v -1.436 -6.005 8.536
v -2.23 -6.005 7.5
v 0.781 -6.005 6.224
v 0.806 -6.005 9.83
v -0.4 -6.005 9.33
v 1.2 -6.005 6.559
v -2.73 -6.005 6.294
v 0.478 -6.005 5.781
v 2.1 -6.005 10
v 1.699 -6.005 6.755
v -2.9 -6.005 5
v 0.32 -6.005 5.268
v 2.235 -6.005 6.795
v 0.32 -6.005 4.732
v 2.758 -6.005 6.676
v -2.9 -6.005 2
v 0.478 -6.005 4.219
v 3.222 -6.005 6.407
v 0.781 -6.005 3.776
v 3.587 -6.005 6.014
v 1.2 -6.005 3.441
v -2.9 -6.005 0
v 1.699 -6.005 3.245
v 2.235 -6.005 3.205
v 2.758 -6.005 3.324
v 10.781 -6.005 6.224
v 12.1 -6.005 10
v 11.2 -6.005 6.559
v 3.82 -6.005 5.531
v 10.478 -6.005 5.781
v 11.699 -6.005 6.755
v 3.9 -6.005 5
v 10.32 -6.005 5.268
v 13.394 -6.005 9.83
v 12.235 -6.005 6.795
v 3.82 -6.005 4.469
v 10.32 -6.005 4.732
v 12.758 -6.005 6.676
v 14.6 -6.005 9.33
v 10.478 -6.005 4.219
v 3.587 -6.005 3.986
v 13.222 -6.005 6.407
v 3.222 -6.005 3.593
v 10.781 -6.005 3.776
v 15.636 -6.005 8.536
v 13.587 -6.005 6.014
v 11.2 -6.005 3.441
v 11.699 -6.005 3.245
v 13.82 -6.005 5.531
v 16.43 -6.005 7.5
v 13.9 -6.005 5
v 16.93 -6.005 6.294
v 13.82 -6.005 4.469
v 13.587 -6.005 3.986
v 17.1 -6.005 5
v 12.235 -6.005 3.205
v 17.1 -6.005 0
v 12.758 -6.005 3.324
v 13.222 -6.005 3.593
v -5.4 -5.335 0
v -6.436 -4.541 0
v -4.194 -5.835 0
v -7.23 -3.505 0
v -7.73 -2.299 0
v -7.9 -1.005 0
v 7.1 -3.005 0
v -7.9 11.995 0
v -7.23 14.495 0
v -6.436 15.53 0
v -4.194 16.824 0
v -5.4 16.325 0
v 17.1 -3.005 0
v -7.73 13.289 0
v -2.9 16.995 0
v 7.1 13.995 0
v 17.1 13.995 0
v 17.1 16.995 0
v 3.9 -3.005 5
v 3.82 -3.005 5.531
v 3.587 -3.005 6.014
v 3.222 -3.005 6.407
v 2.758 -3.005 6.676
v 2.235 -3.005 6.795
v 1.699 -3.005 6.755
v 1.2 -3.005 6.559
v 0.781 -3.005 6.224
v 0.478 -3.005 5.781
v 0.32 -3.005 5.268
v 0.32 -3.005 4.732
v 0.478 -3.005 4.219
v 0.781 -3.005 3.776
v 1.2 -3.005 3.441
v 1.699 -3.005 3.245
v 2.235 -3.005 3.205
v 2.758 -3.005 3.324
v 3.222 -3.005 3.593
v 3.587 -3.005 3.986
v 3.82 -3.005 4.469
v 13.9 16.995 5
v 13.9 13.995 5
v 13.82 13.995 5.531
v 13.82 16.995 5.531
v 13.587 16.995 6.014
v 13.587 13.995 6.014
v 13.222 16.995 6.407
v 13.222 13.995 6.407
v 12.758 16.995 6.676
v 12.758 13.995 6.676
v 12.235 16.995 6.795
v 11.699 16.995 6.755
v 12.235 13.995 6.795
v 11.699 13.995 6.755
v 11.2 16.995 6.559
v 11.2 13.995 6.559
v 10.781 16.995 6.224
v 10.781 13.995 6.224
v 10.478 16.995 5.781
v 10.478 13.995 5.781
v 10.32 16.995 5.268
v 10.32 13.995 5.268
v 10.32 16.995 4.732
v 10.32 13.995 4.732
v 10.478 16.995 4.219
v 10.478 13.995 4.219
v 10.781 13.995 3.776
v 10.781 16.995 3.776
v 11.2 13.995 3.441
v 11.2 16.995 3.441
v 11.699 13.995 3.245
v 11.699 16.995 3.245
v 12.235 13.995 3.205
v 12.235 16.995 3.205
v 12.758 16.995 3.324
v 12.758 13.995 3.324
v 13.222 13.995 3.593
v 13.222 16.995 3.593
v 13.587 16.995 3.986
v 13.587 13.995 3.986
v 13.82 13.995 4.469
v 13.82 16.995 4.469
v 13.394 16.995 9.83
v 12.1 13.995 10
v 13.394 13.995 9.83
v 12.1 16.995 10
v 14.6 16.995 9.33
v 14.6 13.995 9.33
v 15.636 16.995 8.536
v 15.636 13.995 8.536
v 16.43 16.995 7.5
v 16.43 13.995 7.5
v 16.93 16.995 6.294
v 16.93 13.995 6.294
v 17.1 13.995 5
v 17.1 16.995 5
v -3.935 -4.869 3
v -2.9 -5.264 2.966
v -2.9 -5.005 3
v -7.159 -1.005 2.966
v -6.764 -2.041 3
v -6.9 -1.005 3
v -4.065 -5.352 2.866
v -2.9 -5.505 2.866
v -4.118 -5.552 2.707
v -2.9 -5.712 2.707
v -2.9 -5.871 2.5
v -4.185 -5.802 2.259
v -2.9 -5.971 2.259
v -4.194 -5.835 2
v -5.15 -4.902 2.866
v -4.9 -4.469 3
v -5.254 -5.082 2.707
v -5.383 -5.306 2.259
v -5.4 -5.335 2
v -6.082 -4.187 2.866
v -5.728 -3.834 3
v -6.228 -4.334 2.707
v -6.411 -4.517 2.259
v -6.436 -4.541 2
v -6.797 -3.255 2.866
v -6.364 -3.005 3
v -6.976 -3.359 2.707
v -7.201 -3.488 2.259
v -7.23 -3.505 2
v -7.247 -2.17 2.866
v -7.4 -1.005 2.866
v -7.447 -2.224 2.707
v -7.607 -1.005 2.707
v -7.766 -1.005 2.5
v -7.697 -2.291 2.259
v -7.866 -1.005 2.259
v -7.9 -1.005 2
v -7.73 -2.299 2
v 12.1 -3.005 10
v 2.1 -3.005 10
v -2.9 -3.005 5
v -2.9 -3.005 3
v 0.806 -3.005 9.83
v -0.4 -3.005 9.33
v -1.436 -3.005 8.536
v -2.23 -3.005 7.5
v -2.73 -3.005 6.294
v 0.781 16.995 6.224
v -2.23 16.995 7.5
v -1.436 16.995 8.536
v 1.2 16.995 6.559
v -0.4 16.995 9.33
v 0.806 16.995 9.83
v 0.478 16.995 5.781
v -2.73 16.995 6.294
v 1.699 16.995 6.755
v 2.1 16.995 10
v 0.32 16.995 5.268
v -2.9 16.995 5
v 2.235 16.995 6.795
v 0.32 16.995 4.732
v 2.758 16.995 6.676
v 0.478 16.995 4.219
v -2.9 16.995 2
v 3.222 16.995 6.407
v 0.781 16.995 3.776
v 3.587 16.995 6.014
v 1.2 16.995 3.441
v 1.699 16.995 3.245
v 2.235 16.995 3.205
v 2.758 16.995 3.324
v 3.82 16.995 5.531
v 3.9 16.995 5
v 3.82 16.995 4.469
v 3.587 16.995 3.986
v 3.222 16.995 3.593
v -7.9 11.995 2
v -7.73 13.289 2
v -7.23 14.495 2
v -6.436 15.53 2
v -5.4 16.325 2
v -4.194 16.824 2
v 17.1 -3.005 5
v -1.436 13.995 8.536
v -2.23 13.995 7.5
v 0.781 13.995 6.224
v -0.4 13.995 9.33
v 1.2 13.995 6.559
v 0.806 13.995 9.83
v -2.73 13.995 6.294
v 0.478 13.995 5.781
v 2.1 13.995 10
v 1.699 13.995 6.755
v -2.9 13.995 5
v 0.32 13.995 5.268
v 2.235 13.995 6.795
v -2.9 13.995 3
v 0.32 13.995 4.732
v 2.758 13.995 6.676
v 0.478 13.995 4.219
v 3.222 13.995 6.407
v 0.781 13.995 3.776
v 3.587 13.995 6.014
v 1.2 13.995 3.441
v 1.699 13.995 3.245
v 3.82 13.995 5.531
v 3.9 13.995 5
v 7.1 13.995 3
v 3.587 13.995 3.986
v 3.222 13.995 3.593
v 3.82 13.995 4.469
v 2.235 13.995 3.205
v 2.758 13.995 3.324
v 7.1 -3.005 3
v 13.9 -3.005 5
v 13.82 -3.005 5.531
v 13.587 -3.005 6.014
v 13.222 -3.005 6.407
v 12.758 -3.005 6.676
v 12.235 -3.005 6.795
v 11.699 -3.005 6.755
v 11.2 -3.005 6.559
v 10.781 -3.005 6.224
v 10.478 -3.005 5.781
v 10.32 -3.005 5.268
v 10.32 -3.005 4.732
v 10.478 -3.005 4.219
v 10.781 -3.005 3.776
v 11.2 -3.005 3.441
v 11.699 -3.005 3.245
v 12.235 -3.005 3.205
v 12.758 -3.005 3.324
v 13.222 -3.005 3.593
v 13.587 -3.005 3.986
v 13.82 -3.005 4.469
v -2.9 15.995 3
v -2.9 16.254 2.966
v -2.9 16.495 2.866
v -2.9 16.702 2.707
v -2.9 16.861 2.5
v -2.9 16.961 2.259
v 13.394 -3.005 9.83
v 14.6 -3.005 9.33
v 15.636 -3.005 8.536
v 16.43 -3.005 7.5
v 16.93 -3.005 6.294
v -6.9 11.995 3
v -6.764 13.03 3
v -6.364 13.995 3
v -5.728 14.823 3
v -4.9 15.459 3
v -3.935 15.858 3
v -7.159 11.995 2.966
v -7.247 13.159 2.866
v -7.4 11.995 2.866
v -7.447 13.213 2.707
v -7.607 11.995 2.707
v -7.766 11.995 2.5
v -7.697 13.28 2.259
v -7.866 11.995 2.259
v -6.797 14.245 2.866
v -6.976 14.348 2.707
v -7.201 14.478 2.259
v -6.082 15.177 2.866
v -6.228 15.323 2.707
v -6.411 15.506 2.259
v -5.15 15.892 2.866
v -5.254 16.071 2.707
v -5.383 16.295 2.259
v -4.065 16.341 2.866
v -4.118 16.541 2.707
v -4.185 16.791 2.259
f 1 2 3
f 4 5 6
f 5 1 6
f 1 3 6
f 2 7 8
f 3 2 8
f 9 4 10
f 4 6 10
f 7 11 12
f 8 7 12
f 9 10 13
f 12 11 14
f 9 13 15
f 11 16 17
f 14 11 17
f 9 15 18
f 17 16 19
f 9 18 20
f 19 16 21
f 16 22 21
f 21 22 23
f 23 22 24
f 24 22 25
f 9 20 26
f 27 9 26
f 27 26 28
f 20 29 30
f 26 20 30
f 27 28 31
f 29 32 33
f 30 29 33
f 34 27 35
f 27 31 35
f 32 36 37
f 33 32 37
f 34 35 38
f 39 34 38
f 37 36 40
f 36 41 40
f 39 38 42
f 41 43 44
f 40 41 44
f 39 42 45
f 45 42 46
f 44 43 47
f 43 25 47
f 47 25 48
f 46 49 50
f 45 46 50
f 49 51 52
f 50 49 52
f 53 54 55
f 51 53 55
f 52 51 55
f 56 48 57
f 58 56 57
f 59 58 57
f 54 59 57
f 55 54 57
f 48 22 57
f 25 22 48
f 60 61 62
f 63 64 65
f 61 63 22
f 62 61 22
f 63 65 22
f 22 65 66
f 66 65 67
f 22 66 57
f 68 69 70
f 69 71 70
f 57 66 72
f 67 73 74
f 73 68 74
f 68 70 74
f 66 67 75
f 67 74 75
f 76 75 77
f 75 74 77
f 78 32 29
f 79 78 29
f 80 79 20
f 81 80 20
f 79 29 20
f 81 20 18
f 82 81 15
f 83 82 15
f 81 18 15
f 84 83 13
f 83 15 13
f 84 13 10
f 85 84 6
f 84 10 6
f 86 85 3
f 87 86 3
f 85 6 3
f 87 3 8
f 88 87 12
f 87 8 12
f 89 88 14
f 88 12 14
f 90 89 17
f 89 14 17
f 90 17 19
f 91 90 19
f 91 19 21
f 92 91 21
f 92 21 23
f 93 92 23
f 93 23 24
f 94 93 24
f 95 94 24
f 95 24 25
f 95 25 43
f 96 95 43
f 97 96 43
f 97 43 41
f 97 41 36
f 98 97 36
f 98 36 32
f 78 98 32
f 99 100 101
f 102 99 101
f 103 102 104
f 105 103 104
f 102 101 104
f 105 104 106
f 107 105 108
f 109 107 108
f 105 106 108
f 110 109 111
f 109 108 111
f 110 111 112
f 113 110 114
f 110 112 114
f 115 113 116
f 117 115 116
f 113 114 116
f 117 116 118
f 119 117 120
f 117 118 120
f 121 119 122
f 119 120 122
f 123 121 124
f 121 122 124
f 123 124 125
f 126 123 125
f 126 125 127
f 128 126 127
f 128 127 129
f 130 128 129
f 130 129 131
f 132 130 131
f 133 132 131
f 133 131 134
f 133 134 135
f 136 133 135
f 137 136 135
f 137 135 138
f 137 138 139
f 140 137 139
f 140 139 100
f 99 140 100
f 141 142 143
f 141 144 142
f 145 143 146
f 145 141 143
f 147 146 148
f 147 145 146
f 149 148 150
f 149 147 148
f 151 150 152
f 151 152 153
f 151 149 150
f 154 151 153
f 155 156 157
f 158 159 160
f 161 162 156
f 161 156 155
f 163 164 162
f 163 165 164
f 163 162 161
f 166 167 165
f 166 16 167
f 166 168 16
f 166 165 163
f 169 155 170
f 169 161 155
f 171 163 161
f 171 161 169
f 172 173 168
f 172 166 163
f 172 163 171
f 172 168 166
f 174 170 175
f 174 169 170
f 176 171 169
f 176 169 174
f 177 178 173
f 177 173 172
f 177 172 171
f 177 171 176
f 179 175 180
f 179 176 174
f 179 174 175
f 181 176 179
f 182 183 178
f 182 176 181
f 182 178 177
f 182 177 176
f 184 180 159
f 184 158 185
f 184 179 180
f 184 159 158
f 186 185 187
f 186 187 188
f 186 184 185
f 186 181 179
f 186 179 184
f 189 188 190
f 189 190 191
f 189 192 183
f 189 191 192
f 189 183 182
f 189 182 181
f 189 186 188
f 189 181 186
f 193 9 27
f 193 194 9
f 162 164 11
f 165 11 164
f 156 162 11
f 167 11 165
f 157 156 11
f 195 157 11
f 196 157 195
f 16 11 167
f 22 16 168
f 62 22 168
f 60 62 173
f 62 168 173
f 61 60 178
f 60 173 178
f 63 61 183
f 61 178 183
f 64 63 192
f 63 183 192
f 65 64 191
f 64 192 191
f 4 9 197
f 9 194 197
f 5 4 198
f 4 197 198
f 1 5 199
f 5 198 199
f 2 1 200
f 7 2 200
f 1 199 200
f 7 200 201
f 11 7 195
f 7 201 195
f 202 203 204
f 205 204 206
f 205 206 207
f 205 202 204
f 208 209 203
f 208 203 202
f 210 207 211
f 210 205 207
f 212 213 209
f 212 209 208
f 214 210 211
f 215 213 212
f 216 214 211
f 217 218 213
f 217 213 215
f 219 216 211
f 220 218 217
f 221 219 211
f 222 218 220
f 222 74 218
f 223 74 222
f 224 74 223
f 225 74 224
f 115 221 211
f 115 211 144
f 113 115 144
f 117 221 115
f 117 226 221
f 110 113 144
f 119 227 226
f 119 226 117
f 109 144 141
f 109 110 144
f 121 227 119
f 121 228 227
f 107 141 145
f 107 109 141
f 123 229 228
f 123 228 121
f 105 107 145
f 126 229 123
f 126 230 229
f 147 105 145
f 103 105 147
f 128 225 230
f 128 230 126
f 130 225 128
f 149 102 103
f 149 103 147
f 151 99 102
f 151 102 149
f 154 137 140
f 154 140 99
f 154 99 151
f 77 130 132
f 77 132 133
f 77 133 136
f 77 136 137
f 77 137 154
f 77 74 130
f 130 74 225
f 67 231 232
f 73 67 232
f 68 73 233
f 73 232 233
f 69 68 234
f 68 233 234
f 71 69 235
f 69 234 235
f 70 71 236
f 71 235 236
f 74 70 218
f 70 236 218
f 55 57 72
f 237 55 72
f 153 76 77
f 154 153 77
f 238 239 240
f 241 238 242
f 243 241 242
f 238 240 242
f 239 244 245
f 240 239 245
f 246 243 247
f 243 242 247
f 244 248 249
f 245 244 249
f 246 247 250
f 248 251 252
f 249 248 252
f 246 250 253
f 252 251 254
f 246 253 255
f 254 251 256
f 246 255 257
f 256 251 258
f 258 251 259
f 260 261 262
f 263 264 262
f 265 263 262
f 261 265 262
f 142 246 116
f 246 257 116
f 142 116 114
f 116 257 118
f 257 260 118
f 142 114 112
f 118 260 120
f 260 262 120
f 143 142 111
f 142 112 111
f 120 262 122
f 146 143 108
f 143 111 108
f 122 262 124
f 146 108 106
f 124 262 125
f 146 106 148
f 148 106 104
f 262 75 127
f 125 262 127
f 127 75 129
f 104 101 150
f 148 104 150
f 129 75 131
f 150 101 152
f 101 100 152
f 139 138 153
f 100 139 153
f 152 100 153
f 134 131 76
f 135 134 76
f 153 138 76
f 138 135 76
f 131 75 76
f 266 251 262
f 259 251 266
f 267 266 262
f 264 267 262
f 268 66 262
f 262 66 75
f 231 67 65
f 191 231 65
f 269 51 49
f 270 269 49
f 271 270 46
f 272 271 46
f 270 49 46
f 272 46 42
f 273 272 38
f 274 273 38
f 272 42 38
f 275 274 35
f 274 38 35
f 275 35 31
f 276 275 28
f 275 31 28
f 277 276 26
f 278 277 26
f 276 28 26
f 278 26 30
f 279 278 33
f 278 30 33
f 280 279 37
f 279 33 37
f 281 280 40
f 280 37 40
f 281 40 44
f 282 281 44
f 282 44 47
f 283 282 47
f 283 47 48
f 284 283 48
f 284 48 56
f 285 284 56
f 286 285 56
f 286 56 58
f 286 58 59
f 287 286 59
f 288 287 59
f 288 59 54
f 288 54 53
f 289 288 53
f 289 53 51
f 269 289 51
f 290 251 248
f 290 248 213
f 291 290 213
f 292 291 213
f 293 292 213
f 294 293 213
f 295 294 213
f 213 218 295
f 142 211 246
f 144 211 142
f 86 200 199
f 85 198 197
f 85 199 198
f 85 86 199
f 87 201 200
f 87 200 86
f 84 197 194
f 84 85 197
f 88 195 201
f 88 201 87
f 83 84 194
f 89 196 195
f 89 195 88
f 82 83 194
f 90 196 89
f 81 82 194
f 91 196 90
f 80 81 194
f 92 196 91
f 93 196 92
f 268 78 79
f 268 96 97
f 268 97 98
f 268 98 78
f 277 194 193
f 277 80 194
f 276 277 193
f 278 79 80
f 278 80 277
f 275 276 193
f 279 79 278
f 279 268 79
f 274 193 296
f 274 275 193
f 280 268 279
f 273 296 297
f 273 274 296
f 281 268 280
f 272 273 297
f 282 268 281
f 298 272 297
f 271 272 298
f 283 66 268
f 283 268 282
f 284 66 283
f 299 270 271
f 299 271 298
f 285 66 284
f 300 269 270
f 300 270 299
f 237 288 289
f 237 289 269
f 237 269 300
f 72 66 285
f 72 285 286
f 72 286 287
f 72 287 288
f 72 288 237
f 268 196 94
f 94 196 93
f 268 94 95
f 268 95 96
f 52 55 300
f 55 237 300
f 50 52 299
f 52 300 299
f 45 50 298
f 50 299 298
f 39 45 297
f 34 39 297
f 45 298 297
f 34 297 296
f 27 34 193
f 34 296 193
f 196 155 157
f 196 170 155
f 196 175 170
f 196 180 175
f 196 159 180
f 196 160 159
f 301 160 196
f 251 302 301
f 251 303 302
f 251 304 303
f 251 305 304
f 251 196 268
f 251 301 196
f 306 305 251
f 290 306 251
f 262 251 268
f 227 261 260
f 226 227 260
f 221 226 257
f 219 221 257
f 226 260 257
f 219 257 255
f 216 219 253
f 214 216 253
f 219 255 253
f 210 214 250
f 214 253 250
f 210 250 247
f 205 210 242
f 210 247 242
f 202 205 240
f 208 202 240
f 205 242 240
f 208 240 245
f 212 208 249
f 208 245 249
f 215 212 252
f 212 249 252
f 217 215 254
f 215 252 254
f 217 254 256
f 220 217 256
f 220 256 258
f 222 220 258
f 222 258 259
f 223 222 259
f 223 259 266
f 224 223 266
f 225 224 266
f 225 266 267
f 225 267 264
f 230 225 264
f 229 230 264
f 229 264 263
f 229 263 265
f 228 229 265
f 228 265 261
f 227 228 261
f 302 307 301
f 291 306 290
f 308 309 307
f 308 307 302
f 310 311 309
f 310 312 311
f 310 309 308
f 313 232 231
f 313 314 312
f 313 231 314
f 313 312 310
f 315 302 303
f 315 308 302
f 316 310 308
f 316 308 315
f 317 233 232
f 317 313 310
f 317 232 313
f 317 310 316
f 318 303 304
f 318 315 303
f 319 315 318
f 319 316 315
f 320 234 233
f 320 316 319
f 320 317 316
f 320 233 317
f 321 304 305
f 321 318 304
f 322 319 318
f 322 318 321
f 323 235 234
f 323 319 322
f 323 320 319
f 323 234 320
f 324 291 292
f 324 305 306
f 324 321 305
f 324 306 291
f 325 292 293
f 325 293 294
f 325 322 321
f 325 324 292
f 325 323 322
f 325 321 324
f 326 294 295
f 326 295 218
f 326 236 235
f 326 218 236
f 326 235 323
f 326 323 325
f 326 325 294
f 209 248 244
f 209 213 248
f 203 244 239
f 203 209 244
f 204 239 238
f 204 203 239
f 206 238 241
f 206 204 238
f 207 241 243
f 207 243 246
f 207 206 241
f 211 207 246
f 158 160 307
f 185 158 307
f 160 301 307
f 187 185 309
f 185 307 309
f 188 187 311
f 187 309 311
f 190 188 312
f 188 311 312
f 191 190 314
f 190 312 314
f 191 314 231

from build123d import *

# Parameters (mm, degrees)
F1_DEPTH = 3
F2_W     = 20
F2_H     = 3
F3_DEPTH = 7
F4_R     = 5
F5_R     = 5
F6_R     = 1
F7_R     = 1.8
F8_DEPTH = 24


with BuildPart() as f1:
    # F0 (on Top) → F1 (new body)
    with BuildSketch(Plane.XY):
        Polygon((-7.8999784394, 16.9947269248), (-7.8999784394, -6.0052730752), (17.1000215606, -6.0052730752), (17.1000215606, -3.0052730752), (7.1000215606, -3.0052730752), (7.1000215606, 13.9947269248), (17.1000215606, 13.9947269248), (17.1000215606, 16.9947269248), align=None)
    extrude(amount=F1_DEPTH)

    # F2 (on face) → F3 (join)
    with BuildSketch(Plane.XY.offset(3)):
        with Locations((7.1000215606, 15.4947269248)):
            Rectangle(F2_W, F2_H)
        with Locations((7.1000215606, -4.5052730752)):
            Rectangle(F2_W, F2_H)
    extrude(amount=F3_DEPTH)

    # F4
    f4_edges = [f1.edges().sort_by_distance(p)[0] for p in [
        (-7.899978, 16.994727, 1.5),
        (-7.899978, -6.005273, 1.5),
        (-2.899978, -4.505273, 10),
        (-2.899978, 15.494727, 10),
    ]]
    fillet(f4_edges, radius=F4_R)

    # F5
    f5_edges = [f1.edges().sort_by_distance(p)[0] for p in [
        (17.100022, 15.494727, 10),
        (17.100022, -4.505273, 10),
    ]]
    fillet(f5_edges, radius=F5_R)

    # F6
    f6_edges = [f1.edges().sort_by_distance(p)[0] for p in [
        (-6.435512, 15.530261, 3),
        (-7.899978, 5.494727, 3),
        (-6.435512, -4.540807, 3),
    ]]
    fillet(f6_edges, radius=F6_R)

    # F7 (on face) → F8 (cut)
    with BuildSketch(Plane.XZ.offset(6.0052730752)):
        with Locations((12.1000215606, 5)):
            Circle(F7_R)
        with Locations((2.1000215606, 5)):
            Circle(F7_R)
    extrude(amount=-F8_DEPTH, mode=Mode.SUBTRACT)


solid = f1.part
